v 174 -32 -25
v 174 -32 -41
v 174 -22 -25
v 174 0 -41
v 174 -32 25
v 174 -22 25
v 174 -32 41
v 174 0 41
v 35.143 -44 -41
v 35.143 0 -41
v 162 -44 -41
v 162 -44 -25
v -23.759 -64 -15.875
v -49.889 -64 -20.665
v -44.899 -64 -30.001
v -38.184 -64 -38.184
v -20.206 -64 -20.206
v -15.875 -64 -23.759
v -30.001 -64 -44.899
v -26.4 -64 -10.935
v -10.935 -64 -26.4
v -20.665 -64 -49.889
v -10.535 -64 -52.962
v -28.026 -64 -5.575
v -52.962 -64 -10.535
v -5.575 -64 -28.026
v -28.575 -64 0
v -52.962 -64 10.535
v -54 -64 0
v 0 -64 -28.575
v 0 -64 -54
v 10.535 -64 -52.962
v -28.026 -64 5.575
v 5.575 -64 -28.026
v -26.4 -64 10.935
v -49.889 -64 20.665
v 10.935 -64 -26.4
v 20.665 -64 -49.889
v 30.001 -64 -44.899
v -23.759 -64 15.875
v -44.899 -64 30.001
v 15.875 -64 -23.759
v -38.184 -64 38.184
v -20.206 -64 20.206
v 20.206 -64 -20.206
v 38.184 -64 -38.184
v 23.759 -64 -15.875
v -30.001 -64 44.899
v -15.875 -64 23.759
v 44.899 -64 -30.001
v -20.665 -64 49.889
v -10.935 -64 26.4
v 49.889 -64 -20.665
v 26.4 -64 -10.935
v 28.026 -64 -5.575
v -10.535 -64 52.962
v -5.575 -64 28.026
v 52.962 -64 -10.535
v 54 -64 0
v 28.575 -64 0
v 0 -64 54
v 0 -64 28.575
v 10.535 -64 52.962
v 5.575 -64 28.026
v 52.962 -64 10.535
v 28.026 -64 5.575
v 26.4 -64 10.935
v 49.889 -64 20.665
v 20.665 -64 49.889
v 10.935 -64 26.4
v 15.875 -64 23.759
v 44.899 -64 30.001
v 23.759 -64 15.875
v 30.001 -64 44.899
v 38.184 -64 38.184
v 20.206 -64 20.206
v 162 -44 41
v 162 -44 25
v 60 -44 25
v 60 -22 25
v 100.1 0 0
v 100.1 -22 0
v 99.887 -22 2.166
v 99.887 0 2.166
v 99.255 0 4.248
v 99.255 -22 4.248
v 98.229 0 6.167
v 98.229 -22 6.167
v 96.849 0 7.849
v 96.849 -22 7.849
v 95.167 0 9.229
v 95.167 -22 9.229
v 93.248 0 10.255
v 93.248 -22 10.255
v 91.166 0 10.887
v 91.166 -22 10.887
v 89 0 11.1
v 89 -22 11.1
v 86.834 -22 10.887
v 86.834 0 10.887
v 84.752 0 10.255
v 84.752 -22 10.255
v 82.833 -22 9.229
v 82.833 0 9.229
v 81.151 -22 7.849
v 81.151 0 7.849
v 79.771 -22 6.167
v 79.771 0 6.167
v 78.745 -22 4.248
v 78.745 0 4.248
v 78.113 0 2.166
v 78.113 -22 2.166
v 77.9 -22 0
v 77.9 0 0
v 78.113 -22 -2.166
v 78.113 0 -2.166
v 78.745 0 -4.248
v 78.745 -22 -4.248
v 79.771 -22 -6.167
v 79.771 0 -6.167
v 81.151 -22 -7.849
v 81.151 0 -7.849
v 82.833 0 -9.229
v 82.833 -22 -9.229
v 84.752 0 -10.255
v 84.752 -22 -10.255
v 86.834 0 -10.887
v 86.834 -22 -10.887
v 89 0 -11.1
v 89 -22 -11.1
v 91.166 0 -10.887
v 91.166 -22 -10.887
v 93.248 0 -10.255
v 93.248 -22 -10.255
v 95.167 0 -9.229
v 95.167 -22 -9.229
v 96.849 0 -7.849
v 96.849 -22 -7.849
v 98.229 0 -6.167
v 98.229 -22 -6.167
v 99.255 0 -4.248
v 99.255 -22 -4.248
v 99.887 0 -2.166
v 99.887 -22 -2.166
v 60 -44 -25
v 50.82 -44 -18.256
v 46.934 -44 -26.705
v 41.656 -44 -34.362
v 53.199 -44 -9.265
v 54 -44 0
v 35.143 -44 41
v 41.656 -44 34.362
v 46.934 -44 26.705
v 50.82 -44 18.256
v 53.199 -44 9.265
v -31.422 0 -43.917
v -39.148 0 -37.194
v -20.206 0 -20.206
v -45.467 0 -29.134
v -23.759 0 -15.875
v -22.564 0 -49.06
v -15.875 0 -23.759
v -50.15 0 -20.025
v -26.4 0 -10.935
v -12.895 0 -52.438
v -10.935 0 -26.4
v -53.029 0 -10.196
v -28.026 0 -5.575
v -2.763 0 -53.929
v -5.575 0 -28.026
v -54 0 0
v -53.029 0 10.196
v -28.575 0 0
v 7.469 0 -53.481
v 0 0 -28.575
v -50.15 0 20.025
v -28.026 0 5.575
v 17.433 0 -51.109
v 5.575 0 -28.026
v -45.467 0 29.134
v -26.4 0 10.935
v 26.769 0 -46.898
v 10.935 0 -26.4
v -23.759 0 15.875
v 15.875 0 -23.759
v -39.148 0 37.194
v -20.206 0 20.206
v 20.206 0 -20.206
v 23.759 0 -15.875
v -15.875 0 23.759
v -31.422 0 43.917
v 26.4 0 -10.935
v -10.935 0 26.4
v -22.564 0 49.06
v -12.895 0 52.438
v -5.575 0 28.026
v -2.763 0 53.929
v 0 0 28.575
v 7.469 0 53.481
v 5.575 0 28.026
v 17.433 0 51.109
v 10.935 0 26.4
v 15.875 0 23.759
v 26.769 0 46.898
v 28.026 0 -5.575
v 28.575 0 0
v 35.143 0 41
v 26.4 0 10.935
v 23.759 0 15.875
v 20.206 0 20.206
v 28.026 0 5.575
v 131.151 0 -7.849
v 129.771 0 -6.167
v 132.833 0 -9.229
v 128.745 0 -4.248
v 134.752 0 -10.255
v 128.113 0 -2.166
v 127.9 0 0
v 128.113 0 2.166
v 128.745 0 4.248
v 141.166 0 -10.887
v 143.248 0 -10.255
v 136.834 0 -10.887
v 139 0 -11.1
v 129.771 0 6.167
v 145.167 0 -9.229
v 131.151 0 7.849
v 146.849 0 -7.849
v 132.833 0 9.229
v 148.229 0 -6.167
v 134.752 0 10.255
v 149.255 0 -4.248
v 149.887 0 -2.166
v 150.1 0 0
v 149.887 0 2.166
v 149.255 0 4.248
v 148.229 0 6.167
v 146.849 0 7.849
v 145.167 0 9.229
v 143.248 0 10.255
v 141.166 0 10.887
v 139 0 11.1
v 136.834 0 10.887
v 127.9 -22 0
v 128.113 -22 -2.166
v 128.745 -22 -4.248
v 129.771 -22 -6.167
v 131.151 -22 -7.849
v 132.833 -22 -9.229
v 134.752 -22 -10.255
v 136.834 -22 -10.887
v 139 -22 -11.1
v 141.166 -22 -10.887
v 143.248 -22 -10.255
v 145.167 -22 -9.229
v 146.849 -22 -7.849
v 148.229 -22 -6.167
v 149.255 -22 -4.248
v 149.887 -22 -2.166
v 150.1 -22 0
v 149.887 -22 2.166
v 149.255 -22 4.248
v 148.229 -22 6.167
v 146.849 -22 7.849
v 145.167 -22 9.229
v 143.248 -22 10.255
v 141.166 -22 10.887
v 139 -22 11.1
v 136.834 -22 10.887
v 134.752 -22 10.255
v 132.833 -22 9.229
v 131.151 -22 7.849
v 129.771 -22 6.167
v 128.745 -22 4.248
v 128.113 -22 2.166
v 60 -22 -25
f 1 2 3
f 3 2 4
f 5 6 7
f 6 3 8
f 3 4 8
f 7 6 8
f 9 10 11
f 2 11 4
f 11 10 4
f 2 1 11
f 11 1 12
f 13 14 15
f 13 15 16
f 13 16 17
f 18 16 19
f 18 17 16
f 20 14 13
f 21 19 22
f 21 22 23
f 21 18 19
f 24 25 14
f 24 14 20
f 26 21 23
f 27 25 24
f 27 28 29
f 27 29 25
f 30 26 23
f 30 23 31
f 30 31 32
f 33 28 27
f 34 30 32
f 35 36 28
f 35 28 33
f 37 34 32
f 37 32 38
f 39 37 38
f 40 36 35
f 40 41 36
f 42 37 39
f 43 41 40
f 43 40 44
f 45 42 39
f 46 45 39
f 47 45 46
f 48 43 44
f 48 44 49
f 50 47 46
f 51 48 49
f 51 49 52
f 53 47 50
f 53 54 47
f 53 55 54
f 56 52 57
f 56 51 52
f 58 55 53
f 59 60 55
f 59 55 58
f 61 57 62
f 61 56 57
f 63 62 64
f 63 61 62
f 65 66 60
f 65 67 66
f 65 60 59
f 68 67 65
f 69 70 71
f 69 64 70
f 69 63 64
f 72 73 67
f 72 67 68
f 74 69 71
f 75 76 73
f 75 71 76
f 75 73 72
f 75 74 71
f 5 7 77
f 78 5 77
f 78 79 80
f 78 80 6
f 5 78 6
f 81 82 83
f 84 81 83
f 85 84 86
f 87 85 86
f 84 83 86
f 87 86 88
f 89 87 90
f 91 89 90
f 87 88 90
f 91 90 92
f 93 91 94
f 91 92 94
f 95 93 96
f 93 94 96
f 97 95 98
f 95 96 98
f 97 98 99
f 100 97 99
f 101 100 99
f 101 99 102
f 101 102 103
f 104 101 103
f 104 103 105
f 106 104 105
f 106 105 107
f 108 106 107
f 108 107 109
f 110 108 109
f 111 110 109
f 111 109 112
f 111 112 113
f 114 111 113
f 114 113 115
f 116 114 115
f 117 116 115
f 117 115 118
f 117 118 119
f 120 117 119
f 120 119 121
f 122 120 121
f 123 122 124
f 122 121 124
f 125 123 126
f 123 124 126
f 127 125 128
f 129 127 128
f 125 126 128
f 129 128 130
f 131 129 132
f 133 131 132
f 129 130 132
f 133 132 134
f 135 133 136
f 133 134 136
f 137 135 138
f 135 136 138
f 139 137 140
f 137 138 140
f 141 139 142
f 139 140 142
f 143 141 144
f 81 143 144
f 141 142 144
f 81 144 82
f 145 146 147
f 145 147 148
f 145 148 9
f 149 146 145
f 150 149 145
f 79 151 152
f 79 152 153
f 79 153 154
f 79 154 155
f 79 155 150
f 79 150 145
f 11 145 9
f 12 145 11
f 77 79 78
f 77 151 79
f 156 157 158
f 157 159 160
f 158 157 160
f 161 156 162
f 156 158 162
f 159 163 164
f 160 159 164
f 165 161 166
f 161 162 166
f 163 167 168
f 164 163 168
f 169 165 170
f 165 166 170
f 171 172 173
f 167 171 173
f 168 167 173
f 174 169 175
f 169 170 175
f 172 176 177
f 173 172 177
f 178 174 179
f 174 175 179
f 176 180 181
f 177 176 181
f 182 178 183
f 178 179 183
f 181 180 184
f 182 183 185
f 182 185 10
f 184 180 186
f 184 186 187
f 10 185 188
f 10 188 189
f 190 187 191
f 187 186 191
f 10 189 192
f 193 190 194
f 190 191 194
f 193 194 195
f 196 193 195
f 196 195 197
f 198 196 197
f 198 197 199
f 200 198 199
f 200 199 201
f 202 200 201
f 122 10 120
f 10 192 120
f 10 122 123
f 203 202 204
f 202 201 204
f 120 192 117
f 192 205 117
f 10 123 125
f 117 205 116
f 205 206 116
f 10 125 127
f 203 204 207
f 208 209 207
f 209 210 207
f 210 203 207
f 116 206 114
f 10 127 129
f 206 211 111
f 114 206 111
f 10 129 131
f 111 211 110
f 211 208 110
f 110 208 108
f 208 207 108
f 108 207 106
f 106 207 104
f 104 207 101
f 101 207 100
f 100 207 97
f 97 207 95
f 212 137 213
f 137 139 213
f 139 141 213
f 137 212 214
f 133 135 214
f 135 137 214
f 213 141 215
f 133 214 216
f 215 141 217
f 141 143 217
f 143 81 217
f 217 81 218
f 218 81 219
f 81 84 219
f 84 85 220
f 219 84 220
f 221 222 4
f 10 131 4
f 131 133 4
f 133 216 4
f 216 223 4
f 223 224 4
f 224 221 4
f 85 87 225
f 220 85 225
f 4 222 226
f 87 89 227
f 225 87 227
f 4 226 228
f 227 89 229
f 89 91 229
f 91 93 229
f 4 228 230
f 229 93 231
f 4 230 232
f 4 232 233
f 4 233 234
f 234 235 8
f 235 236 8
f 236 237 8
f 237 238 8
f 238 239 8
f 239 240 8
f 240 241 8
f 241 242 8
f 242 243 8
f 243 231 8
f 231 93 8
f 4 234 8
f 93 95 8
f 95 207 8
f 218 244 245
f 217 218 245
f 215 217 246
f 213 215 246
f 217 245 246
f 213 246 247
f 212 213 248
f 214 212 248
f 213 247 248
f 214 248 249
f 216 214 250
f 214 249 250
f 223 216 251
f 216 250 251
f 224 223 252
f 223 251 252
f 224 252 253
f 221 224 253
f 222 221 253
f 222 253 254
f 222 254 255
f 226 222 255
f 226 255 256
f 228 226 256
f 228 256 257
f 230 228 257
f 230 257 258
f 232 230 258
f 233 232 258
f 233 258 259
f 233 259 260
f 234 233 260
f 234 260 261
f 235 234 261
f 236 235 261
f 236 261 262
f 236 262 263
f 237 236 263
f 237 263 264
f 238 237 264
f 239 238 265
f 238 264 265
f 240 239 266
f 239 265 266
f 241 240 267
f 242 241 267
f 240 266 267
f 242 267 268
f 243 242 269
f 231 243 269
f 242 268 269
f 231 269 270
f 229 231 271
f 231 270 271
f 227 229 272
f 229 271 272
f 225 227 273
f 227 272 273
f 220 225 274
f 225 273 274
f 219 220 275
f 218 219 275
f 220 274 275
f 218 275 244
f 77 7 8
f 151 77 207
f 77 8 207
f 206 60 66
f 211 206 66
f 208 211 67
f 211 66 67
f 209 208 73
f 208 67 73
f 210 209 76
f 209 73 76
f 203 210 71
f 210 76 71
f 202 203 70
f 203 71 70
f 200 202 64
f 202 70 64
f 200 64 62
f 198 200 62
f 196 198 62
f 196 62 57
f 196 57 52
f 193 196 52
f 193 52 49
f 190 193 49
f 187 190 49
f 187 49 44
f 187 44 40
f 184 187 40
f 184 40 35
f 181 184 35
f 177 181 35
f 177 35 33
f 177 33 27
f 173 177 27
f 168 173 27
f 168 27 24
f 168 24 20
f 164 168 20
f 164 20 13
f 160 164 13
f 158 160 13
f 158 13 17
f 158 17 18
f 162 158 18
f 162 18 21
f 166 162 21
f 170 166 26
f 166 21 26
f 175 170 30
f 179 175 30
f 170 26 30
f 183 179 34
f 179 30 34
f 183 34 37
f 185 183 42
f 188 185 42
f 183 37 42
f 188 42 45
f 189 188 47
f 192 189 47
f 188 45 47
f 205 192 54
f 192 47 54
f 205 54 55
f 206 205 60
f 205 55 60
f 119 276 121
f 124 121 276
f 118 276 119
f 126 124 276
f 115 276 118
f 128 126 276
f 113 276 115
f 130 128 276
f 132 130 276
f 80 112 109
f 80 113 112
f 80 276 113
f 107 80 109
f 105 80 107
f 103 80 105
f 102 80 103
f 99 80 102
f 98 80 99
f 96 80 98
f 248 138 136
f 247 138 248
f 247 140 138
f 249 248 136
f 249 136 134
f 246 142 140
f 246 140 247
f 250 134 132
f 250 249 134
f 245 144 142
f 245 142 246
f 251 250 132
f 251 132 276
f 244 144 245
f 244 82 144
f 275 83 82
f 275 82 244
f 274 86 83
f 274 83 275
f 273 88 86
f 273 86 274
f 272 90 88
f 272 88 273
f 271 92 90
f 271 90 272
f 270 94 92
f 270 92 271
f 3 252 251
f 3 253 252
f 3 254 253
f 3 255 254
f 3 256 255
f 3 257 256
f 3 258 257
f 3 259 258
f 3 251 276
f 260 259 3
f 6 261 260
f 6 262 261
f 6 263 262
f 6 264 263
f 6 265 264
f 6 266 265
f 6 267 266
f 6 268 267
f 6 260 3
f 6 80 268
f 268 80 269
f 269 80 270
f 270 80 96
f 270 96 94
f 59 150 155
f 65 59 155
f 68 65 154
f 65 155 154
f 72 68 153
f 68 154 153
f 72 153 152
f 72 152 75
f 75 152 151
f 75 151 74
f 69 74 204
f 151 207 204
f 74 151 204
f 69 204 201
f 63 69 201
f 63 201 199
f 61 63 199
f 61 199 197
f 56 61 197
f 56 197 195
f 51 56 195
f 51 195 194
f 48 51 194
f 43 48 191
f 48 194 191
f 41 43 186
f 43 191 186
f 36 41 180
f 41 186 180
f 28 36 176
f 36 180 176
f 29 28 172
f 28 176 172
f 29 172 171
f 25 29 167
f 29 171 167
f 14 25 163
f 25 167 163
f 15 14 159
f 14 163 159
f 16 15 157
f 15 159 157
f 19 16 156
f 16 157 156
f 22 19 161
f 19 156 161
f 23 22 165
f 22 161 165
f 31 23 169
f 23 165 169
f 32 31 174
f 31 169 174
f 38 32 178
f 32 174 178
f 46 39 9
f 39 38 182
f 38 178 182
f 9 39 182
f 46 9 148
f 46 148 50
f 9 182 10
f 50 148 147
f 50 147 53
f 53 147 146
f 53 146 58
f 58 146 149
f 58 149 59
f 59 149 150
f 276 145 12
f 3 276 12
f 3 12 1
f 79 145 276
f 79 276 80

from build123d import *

# Parameters (mm, degrees)
F1_DEPTH  = 44
F2_R      = 54
F2_R_2    = 28.575
F3_DEPTH  = 64
F4_W      = 114
F4_H      = 50
F5_DEPTH  = 22
F6_R      = 11.1
F7_DEPTH  = 22.001
F9_DEPTH  = 64.001
F11_DEPTH = 95.001


with BuildPart() as f1:
    # F0 (on Front) → F1 (new body)
    with BuildSketch(Plane.XZ):
        with BuildLine():
            ThreePointArc((35.1425667816, 41), (49.0596504584, 22.5643678594), (54, 0))
            Line((54, 0), (174, 0))
            Line((174, 0), (174, 41))
            Line((174, 41), (35.1425667816, 41))
        make_face()
        with BuildLine():
            Line((174, 0), (54, 0))
            ThreePointArc((54, 0), (49.0596504584, -22.5643678594), (35.1425667816, -41))
            Line((35.1425667816, -41), (174, -41))
            Line((174, -41), (174, 0))
        make_face()
    extrude(amount=F1_DEPTH)

    # F2 (on Front) → F3 (join)
    with BuildSketch(Plane.XZ):
        Circle(F2_R)
        Circle(F2_R_2, mode=Mode.SUBTRACT)
        Circle(F2_R_2)
    extrude(amount=F3_DEPTH)

    # F4 (on face) → F5 (cut)
    with BuildSketch(Plane.XZ.offset(44)):
        with Locations((117, 0)):
            Rectangle(F4_W, F4_H)
    extrude(amount=-F5_DEPTH, mode=Mode.SUBTRACT)

    # F6 (on face) → F7 (cut, through all)
    with BuildSketch(Plane.XZ.offset(22)):
        with BuildLine():
            Line((139, 0), (150.1, 0))
            ThreePointArc((150.1, 0), (139, 11.1), (127.9, 0))
            Line((127.9, 0), (139, 0))
        make_face()
        with BuildLine():
            ThreePointArc((127.9, 0), (139, -11.1), (150.1, 0))
            Line((150.1, 0), (139, 0))
            Line((139, 0), (127.9, 0))
        make_face()
        with Locations((89, 0)):
            Circle(F6_R)
    extrude(amount=-F7_DEPTH, mode=Mode.SUBTRACT)

    # F8 (on face) → F9 (cut, through all)
    with BuildSketch(Plane.XZ.offset(64)):
        with BuildLine():
            ThreePointArc((-28.575, 0), (0, -28.575), (28.575, 0))
            ThreePointArc((28.575, 0), (0, 28.575), (-28.575, 0))
        make_face()
    extrude(amount=-F9_DEPTH, mode=Mode.SUBTRACT)

    # F10 (on face) → F11 (cut, through all)
    with BuildSketch(Plane.XY.offset(41)):
        Polygon((174, -32), (162, -44), (174, -44), align=None)
    extrude(amount=-F11_DEPTH, mode=Mode.SUBTRACT)


solid = f1.part
